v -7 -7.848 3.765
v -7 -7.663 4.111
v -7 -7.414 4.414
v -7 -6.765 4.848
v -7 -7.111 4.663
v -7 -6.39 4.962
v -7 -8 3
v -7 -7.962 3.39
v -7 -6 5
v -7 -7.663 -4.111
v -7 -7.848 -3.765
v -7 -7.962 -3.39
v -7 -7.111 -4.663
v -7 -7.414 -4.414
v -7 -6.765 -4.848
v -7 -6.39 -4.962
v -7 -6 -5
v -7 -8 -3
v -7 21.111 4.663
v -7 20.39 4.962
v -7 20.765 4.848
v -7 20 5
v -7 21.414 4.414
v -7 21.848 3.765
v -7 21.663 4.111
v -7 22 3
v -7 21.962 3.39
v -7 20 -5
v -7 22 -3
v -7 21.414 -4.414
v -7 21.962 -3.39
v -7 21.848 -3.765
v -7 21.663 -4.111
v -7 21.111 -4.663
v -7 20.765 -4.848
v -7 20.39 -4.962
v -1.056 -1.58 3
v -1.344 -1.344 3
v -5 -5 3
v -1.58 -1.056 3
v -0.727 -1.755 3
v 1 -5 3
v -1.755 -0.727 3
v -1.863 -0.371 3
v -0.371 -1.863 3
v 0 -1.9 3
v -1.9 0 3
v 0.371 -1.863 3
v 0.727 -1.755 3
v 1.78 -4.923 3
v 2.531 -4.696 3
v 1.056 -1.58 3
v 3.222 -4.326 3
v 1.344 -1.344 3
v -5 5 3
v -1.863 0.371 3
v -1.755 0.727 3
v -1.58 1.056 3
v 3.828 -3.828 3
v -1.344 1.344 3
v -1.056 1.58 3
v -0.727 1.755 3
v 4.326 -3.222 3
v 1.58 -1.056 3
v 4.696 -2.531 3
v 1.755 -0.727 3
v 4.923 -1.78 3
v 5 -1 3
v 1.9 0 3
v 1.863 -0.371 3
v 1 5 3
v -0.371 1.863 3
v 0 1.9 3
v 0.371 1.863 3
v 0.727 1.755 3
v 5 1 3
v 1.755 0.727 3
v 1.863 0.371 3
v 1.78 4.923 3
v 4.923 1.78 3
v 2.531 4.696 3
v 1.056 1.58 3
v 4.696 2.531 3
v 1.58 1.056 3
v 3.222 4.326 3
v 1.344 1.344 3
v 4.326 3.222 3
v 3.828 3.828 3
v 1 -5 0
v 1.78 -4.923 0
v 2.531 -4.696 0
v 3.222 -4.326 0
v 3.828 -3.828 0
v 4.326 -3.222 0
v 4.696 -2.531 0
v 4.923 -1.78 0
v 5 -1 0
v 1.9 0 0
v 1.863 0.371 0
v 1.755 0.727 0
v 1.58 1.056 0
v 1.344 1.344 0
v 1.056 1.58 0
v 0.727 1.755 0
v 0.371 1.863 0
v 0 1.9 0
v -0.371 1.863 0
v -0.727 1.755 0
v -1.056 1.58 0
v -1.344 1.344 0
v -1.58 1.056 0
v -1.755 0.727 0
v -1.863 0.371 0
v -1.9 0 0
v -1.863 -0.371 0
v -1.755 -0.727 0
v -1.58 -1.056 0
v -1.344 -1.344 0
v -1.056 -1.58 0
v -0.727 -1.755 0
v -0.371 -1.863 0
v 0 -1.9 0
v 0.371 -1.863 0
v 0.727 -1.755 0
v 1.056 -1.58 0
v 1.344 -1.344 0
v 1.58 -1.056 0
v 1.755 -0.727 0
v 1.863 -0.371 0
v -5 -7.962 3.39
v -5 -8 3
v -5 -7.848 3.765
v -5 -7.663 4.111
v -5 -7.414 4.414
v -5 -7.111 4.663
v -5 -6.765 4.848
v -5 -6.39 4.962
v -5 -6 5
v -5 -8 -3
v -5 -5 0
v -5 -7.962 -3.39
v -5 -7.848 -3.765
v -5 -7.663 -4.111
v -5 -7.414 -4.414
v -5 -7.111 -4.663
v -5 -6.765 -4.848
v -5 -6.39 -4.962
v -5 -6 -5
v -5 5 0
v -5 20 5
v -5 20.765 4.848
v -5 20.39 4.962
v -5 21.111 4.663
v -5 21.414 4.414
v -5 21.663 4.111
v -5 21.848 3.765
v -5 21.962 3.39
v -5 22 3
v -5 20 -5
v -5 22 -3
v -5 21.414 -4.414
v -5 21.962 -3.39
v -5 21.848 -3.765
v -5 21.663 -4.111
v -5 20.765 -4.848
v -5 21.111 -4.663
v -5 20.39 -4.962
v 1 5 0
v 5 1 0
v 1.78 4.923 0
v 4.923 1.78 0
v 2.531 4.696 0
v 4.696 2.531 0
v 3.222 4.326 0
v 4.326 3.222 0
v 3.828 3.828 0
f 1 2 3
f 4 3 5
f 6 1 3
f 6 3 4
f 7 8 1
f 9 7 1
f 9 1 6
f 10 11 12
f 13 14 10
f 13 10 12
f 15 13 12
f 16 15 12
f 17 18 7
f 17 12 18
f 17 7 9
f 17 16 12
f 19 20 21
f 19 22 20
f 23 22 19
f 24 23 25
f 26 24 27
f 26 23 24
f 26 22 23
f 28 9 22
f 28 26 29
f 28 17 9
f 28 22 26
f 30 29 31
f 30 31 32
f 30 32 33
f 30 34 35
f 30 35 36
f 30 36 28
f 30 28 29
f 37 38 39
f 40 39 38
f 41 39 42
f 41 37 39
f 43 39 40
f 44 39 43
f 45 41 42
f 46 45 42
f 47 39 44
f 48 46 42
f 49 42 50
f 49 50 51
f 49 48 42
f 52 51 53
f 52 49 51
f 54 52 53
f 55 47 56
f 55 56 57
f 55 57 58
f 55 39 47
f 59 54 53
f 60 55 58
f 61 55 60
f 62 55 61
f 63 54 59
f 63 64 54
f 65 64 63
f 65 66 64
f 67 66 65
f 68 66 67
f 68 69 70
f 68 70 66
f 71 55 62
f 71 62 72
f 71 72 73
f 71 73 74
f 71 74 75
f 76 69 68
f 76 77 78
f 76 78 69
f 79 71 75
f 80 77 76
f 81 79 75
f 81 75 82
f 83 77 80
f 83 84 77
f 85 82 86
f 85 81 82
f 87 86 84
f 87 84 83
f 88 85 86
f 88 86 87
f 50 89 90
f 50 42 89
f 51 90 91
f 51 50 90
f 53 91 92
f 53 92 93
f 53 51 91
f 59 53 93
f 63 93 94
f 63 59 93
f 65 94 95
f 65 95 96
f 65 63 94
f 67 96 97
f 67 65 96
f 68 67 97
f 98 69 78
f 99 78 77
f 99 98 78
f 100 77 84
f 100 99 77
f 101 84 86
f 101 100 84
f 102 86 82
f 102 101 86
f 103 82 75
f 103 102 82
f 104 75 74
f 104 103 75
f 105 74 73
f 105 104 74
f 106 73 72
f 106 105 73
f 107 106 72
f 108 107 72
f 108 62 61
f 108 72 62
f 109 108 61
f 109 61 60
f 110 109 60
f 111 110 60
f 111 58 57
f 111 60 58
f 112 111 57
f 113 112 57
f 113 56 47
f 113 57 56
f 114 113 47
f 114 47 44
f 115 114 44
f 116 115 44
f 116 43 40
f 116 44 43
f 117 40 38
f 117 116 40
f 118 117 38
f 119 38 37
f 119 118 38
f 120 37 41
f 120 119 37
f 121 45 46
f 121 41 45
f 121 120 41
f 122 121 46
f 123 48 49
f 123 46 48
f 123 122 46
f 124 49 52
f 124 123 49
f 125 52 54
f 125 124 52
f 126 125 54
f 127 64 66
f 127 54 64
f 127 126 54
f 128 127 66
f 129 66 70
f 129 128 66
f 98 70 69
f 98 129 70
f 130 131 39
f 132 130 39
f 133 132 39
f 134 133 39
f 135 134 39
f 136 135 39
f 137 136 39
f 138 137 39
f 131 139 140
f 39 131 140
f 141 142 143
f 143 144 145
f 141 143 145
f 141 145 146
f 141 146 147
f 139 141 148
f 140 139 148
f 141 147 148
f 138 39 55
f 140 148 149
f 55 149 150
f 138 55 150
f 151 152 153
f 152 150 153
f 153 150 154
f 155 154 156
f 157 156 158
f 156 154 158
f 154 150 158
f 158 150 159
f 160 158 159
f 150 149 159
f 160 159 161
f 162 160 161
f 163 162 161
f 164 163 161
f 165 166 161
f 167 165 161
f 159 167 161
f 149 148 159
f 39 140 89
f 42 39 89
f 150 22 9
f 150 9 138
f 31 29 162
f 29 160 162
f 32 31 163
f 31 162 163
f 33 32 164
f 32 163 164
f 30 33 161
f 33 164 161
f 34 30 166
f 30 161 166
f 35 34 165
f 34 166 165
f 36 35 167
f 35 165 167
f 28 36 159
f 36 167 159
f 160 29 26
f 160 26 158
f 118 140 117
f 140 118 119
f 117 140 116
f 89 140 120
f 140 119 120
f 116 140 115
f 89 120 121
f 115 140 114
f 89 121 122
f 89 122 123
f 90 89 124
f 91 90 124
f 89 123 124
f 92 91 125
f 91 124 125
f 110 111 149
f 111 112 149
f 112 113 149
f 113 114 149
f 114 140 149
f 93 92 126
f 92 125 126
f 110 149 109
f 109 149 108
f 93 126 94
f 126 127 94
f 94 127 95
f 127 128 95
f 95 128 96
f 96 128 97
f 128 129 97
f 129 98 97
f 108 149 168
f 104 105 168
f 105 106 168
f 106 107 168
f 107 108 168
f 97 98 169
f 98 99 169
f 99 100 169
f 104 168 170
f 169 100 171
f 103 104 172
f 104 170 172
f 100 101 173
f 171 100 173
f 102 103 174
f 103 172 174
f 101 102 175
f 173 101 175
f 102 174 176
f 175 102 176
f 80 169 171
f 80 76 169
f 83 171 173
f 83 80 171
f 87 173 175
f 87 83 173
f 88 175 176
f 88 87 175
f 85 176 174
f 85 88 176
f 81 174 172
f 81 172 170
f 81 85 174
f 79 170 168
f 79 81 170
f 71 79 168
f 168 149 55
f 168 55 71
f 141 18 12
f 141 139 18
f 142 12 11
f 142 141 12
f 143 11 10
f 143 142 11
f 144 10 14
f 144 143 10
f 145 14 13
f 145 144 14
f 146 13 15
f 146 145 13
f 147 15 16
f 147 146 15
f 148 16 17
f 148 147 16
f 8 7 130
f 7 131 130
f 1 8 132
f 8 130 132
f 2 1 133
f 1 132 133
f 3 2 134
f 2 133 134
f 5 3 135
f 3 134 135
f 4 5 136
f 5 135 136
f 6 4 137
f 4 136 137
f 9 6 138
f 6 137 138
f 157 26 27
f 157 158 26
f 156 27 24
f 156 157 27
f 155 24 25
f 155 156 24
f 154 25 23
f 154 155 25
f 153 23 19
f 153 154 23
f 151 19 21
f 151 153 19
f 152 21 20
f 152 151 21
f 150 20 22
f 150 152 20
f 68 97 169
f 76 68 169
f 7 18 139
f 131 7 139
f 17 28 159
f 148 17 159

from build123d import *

# Parameters (mm, degrees)
CYLINDER_R     = 1.9
CYLINDER_DEPTH = 10
BOX_W          = 10
BOX_H          = 10
BOX_DEPTH      = 3
FILLET_R       = 4
BOX001_W       = 2
BOX001_H       = 30
BOX001_DEPTH   = 10
FILLET001_R    = 2


with BuildPart() as hole:
    # Cylinder → Cylinder (new body)
    with BuildSketch(Plane.XY):
        Circle(CYLINDER_R)
    extrude(amount=CYLINDER_DEPTH)


with BuildPart() as bottom_fillet:
    # Box → Box (new body)
    with BuildSketch(Plane(origin=(-5, -5, 0), x_dir=(1, 0, 0), z_dir=(0, 0, 1))):
        with Locations((5, 5)):
            Rectangle(BOX_W, BOX_H)
    extrude(amount=BOX_DEPTH)

    # Fillet
    fillet_edges = [bottom_fillet.edges().sort_by_distance(p)[0] for p in [
        (5, -5, 1.5),
        (5, 5, 1.5),
    ]]
    fillet(fillet_edges, radius=FILLET_R)


with BuildPart() as lock_cut:
    # Box001 → Box001 (new body)
    with BuildSketch(Plane(origin=(-7, -8, -5), x_dir=(1, 0, 0), z_dir=(0, 0, 1))):
        with Locations((1, 15)):
            Rectangle(BOX001_W, BOX001_H)
    extrude(amount=BOX001_DEPTH)

    # Fillet001
    fillet001_edges = [lock_cut.edges().sort_by_distance(p)[0] for p in [
        (-6, -8, -5),
        (-6, -8, 5),
        (-6, 22, -5),
        (-6, 22, 5),
    ]]
    fillet(fillet001_edges, radius=FILLET001_R)

    # Fusion: union bottom fillet
    add(bottom_fillet.part)

    # Cut: cut hole
    add(hole.part, mode=Mode.SUBTRACT)


solid = lock_cut.part
